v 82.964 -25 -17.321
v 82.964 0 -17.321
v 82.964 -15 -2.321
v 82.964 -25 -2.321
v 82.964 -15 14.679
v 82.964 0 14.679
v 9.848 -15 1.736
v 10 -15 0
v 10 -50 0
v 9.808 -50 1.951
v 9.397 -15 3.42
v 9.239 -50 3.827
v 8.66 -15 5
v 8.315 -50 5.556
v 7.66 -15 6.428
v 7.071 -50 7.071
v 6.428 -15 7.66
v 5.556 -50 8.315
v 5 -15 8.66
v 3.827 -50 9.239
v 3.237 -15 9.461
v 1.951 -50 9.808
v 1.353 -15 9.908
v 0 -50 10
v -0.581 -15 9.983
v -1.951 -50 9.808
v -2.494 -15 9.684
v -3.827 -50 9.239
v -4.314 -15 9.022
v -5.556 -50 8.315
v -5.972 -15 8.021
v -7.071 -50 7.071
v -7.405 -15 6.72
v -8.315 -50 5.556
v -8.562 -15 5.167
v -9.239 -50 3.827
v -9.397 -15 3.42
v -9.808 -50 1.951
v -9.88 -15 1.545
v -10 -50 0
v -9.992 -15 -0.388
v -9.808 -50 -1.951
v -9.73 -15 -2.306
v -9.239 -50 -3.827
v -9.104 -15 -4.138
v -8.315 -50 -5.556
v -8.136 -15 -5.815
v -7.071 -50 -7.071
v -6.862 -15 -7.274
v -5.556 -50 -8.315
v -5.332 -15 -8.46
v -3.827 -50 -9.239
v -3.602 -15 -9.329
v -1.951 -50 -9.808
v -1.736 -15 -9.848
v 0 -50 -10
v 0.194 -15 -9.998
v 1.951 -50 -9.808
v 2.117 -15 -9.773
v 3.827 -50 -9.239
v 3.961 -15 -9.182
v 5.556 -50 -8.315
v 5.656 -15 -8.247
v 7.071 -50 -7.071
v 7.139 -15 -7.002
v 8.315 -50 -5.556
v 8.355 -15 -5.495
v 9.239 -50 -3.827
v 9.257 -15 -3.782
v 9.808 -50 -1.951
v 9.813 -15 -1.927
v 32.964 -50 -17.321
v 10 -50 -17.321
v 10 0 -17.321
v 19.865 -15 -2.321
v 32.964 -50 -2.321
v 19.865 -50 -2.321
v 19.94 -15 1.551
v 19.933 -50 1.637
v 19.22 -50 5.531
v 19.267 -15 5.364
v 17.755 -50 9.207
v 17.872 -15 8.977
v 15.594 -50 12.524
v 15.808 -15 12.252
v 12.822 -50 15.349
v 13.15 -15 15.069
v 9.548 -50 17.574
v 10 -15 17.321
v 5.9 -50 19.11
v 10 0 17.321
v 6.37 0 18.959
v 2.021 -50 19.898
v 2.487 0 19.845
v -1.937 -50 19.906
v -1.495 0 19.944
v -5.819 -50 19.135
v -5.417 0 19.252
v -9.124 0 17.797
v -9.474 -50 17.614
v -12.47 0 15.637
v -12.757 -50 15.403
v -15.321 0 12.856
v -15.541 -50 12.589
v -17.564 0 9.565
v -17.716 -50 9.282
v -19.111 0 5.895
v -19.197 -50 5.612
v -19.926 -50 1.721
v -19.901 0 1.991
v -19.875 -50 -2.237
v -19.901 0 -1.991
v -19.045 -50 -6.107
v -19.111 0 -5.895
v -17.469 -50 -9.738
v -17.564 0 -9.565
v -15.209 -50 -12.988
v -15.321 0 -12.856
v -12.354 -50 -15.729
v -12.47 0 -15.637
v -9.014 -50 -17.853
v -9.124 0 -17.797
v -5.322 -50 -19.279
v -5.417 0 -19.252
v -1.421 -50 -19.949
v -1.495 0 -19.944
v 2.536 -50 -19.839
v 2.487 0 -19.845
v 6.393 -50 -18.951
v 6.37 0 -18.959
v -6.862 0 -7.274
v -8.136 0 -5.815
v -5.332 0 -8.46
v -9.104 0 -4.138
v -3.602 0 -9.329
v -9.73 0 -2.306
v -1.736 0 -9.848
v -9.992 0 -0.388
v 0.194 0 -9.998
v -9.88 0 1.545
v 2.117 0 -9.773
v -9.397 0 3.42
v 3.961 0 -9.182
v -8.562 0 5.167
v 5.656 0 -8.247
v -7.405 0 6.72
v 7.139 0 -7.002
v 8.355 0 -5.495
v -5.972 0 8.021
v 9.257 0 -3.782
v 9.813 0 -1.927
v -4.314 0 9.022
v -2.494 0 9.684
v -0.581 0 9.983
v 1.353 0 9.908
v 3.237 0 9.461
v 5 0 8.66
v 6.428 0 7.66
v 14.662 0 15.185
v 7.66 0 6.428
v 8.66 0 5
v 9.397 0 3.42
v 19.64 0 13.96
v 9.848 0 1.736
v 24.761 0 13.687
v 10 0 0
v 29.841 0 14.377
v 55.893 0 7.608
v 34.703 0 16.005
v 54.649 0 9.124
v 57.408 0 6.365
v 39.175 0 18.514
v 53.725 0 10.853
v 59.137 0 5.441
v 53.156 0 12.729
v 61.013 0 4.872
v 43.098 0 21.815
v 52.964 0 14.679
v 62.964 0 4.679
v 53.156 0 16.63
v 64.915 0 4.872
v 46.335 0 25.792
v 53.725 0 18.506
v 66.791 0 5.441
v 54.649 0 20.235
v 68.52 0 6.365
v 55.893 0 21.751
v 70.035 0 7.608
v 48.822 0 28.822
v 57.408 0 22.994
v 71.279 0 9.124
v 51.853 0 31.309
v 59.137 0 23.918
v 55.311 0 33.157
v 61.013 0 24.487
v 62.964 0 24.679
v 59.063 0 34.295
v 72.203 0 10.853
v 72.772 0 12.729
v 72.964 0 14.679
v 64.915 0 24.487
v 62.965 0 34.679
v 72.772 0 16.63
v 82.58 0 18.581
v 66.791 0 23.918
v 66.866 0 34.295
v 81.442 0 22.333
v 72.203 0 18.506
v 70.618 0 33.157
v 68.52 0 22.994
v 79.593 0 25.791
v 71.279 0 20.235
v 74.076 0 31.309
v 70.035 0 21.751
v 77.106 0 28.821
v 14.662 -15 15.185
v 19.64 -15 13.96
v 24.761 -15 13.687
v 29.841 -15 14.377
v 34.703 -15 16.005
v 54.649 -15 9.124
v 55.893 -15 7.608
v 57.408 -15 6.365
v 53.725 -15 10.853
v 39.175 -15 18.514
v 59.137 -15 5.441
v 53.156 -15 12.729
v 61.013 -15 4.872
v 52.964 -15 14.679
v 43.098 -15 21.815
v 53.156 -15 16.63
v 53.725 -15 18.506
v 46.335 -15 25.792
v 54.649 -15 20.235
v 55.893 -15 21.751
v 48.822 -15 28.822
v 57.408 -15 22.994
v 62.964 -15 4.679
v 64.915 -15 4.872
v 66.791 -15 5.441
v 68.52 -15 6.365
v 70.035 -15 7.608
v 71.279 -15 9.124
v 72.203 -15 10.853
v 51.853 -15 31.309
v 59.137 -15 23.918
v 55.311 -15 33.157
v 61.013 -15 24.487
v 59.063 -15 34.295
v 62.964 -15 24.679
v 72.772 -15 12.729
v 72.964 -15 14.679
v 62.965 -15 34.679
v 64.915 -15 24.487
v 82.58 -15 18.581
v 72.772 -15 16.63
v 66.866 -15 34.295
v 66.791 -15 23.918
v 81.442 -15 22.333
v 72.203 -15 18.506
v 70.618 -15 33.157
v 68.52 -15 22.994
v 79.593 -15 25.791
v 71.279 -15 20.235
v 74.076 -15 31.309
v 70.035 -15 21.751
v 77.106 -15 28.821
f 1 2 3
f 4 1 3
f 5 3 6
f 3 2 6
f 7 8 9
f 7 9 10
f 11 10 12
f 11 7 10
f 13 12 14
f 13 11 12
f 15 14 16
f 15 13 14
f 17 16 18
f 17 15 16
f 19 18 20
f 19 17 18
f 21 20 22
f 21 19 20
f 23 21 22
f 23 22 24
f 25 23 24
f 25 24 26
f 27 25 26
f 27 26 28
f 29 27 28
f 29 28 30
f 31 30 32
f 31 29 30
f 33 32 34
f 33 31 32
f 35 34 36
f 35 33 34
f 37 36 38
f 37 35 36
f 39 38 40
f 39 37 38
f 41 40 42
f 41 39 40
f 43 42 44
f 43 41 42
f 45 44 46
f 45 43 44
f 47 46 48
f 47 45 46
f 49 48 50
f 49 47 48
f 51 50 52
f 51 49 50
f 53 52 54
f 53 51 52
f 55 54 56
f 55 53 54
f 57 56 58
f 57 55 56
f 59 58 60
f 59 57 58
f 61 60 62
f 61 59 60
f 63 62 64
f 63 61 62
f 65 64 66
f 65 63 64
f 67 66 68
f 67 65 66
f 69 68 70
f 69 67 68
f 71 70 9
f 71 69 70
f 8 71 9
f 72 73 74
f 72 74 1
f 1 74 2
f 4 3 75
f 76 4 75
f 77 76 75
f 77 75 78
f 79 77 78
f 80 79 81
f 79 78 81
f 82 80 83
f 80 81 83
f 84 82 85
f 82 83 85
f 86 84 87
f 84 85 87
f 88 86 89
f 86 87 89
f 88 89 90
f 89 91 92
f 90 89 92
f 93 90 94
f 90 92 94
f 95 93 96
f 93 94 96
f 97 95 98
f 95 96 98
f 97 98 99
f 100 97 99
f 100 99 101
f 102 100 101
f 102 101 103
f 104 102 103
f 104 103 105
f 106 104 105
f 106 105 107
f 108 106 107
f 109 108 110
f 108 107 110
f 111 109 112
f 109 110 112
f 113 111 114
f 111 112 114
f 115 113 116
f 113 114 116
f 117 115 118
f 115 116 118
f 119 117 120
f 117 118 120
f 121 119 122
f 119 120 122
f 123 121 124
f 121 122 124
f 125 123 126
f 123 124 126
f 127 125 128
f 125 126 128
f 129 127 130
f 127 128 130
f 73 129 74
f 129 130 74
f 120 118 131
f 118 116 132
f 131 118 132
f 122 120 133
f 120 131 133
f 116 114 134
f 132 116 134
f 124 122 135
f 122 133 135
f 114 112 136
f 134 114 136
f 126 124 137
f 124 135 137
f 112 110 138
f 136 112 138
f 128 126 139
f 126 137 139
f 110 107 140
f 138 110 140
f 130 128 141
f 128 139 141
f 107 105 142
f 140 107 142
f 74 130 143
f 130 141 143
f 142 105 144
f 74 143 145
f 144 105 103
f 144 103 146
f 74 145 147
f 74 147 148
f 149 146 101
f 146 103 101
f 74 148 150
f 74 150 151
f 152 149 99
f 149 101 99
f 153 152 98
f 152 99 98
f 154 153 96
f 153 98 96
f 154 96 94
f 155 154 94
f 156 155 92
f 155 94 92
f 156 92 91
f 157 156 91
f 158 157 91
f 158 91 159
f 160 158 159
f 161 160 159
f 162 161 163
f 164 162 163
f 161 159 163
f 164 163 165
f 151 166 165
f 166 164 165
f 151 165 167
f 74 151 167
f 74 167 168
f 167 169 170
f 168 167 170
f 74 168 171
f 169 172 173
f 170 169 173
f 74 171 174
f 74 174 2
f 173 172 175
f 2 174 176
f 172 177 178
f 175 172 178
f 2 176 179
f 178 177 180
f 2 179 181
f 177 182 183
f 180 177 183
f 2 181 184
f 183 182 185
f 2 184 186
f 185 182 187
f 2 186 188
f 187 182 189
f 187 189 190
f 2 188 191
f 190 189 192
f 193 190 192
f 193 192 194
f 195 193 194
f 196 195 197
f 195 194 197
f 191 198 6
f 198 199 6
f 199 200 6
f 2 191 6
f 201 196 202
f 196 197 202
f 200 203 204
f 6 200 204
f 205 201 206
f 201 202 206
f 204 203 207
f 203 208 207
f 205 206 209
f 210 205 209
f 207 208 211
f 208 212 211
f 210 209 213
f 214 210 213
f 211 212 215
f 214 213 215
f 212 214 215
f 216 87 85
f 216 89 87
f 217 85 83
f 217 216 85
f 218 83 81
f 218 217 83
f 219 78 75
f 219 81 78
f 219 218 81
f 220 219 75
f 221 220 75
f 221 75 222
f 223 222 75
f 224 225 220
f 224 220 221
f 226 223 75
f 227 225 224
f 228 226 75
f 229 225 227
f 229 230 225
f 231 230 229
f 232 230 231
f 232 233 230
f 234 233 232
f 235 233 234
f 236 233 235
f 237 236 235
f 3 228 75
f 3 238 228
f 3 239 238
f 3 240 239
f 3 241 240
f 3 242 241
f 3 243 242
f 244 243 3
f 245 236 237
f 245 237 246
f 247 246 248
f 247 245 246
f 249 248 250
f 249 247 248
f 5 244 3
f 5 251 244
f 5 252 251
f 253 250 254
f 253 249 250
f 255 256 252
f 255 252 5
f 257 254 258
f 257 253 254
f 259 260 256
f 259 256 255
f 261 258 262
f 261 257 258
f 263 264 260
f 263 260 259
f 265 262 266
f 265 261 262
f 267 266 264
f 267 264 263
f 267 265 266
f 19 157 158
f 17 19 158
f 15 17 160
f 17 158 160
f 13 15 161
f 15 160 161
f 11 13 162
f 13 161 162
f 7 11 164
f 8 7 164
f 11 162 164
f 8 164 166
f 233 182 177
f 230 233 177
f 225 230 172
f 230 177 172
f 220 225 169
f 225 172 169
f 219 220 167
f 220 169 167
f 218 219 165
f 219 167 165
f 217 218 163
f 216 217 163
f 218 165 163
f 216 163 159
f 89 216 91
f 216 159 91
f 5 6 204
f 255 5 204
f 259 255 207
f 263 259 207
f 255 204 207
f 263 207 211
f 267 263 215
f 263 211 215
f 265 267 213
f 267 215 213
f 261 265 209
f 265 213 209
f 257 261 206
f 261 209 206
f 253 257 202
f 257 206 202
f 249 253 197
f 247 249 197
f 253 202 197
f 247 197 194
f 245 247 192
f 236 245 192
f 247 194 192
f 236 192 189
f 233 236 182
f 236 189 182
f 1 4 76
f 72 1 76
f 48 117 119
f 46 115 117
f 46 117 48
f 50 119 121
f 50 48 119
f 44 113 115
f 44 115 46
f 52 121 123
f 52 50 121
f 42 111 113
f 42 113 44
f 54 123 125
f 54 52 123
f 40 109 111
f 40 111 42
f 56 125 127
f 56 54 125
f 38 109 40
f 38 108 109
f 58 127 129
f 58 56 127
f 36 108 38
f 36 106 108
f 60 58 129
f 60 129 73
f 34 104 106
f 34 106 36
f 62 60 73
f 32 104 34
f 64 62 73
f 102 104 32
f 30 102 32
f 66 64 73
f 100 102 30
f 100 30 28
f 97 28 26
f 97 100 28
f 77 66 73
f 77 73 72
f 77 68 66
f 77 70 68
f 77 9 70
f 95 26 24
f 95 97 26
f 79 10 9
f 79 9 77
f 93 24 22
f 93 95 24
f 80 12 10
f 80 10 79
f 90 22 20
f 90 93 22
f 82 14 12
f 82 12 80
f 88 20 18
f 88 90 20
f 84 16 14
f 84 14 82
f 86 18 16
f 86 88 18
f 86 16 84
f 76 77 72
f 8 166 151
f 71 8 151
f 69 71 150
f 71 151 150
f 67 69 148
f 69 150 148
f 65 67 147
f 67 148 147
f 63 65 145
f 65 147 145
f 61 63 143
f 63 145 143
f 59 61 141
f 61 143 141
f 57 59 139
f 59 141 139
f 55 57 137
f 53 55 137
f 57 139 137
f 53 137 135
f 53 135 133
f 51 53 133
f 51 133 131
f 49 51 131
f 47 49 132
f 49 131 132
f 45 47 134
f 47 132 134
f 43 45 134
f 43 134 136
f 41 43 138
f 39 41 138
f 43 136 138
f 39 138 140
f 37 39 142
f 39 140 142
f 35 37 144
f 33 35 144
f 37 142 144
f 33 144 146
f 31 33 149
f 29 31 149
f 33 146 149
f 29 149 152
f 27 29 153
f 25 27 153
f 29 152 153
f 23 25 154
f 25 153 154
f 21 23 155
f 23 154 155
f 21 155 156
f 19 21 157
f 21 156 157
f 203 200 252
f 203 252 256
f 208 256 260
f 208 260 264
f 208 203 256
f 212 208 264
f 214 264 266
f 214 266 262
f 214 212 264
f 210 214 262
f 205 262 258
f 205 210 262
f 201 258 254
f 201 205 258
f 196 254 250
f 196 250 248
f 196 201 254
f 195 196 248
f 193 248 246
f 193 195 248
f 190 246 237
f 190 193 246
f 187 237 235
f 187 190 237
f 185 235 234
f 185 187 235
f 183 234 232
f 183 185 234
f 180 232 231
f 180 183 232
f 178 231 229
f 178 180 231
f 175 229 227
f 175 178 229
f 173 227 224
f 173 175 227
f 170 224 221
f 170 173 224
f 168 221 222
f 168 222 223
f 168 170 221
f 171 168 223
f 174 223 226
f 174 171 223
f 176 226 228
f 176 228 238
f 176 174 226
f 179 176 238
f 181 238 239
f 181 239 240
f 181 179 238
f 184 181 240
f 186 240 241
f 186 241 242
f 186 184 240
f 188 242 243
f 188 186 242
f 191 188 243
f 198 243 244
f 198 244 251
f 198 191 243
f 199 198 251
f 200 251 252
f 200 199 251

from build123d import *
from build123d import SkipClean  # not in build123d's __all__

# Parameters (mm, degrees)
F0_R     = 10
F1_DEPTH = 15
F2_R     = 10
F3_DEPTH = 35
F5_DEPTH = 35
F7_DEPTH = 15


# Not quite as in the source:
# - after a boolean that leaves OpenCascade's solid faulty, fix() repairs it


with BuildPart() as f1:
    # F0 (on Front) → F1 (new body)
    with BuildSketch(Plane.XZ):
        with BuildLine():
            ThreePointArc((46.3350602938, 25.7917141365), (29.8412578998, 14.3770862565), (10, 17.3205080757))
            ThreePointArc((10, 17.3205080757), (-20, 0), (10, -17.3205080757))
            Line((10, -17.3205080757), (82.9639062402, -17.3205080757))
            Line((82.9639062402, -17.3205080757), (82.9639062402, 14.6794919243))
            ThreePointArc((82.9639062402, 14.6794919243), (68.7700702523, 33.818155918), (46.3350602938, 25.7917141365))
        make_face()
        with BuildLine():
            ThreePointArc((5, 8.6602540378), (8.6602540378, 5), (10, 0))
            ThreePointArc((10, 0), (-8.6602540378, -5), (5, 8.6602540378))
        make_face(mode=Mode.SUBTRACT)
        with Locations((62.9639062402, 14.6794919243)):
            Circle(F0_R, mode=Mode.SUBTRACT)
    extrude(amount=F1_DEPTH)

    # F2 (on face) → F3 (join)
    with BuildSketch(Plane.XZ.offset(15)):
        with BuildLine():
            ThreePointArc((10, -17.3205080757), (17.3205080757, -10), (20, 0))
            ThreePointArc((20, 0), (17.3205080757, 10), (10, 17.3205080757))
            ThreePointArc((10, 17.3205080757), (-20, 0), (10, -17.3205080757))
        make_face()
        Circle(F2_R, mode=Mode.SUBTRACT)
    with SkipClean():  # cleaning this boolean's faces spoils the solid; the shape is the same uncleaned
        extrude(amount=F3_DEPTH)

    # F4 (on face) → F5 (join)
    with BuildSketch(Plane.XZ.offset(15)):
        with BuildLine():
            Line((10, -17.3205080757), (82.9639062402, -17.3205080757))
            Line((82.9639062402, -17.3205080757), (82.9639062402, -2.3205080757))
            Line((82.9639062402, -2.3205080757), (19.8649249249, -2.3205080757))
            ThreePointArc((19.8649249249, -2.3205080757), (16.710129718, -10.9896116769), (10, -17.3205080757))
        make_face()
    extrude(amount=F5_DEPTH)

    add(f1.part.fix(), mode=Mode.REPLACE)

    # F6 (on face) → F7 (cut, through all)
    with BuildSketch(Plane.XY.offset(-2.3205080757)):
        Polygon((82.9639062402, -50), (82.9639062402, -25), (32.9639062402, -50), align=None)
    extrude(amount=-F7_DEPTH, mode=Mode.SUBTRACT)


solid = f1.part
